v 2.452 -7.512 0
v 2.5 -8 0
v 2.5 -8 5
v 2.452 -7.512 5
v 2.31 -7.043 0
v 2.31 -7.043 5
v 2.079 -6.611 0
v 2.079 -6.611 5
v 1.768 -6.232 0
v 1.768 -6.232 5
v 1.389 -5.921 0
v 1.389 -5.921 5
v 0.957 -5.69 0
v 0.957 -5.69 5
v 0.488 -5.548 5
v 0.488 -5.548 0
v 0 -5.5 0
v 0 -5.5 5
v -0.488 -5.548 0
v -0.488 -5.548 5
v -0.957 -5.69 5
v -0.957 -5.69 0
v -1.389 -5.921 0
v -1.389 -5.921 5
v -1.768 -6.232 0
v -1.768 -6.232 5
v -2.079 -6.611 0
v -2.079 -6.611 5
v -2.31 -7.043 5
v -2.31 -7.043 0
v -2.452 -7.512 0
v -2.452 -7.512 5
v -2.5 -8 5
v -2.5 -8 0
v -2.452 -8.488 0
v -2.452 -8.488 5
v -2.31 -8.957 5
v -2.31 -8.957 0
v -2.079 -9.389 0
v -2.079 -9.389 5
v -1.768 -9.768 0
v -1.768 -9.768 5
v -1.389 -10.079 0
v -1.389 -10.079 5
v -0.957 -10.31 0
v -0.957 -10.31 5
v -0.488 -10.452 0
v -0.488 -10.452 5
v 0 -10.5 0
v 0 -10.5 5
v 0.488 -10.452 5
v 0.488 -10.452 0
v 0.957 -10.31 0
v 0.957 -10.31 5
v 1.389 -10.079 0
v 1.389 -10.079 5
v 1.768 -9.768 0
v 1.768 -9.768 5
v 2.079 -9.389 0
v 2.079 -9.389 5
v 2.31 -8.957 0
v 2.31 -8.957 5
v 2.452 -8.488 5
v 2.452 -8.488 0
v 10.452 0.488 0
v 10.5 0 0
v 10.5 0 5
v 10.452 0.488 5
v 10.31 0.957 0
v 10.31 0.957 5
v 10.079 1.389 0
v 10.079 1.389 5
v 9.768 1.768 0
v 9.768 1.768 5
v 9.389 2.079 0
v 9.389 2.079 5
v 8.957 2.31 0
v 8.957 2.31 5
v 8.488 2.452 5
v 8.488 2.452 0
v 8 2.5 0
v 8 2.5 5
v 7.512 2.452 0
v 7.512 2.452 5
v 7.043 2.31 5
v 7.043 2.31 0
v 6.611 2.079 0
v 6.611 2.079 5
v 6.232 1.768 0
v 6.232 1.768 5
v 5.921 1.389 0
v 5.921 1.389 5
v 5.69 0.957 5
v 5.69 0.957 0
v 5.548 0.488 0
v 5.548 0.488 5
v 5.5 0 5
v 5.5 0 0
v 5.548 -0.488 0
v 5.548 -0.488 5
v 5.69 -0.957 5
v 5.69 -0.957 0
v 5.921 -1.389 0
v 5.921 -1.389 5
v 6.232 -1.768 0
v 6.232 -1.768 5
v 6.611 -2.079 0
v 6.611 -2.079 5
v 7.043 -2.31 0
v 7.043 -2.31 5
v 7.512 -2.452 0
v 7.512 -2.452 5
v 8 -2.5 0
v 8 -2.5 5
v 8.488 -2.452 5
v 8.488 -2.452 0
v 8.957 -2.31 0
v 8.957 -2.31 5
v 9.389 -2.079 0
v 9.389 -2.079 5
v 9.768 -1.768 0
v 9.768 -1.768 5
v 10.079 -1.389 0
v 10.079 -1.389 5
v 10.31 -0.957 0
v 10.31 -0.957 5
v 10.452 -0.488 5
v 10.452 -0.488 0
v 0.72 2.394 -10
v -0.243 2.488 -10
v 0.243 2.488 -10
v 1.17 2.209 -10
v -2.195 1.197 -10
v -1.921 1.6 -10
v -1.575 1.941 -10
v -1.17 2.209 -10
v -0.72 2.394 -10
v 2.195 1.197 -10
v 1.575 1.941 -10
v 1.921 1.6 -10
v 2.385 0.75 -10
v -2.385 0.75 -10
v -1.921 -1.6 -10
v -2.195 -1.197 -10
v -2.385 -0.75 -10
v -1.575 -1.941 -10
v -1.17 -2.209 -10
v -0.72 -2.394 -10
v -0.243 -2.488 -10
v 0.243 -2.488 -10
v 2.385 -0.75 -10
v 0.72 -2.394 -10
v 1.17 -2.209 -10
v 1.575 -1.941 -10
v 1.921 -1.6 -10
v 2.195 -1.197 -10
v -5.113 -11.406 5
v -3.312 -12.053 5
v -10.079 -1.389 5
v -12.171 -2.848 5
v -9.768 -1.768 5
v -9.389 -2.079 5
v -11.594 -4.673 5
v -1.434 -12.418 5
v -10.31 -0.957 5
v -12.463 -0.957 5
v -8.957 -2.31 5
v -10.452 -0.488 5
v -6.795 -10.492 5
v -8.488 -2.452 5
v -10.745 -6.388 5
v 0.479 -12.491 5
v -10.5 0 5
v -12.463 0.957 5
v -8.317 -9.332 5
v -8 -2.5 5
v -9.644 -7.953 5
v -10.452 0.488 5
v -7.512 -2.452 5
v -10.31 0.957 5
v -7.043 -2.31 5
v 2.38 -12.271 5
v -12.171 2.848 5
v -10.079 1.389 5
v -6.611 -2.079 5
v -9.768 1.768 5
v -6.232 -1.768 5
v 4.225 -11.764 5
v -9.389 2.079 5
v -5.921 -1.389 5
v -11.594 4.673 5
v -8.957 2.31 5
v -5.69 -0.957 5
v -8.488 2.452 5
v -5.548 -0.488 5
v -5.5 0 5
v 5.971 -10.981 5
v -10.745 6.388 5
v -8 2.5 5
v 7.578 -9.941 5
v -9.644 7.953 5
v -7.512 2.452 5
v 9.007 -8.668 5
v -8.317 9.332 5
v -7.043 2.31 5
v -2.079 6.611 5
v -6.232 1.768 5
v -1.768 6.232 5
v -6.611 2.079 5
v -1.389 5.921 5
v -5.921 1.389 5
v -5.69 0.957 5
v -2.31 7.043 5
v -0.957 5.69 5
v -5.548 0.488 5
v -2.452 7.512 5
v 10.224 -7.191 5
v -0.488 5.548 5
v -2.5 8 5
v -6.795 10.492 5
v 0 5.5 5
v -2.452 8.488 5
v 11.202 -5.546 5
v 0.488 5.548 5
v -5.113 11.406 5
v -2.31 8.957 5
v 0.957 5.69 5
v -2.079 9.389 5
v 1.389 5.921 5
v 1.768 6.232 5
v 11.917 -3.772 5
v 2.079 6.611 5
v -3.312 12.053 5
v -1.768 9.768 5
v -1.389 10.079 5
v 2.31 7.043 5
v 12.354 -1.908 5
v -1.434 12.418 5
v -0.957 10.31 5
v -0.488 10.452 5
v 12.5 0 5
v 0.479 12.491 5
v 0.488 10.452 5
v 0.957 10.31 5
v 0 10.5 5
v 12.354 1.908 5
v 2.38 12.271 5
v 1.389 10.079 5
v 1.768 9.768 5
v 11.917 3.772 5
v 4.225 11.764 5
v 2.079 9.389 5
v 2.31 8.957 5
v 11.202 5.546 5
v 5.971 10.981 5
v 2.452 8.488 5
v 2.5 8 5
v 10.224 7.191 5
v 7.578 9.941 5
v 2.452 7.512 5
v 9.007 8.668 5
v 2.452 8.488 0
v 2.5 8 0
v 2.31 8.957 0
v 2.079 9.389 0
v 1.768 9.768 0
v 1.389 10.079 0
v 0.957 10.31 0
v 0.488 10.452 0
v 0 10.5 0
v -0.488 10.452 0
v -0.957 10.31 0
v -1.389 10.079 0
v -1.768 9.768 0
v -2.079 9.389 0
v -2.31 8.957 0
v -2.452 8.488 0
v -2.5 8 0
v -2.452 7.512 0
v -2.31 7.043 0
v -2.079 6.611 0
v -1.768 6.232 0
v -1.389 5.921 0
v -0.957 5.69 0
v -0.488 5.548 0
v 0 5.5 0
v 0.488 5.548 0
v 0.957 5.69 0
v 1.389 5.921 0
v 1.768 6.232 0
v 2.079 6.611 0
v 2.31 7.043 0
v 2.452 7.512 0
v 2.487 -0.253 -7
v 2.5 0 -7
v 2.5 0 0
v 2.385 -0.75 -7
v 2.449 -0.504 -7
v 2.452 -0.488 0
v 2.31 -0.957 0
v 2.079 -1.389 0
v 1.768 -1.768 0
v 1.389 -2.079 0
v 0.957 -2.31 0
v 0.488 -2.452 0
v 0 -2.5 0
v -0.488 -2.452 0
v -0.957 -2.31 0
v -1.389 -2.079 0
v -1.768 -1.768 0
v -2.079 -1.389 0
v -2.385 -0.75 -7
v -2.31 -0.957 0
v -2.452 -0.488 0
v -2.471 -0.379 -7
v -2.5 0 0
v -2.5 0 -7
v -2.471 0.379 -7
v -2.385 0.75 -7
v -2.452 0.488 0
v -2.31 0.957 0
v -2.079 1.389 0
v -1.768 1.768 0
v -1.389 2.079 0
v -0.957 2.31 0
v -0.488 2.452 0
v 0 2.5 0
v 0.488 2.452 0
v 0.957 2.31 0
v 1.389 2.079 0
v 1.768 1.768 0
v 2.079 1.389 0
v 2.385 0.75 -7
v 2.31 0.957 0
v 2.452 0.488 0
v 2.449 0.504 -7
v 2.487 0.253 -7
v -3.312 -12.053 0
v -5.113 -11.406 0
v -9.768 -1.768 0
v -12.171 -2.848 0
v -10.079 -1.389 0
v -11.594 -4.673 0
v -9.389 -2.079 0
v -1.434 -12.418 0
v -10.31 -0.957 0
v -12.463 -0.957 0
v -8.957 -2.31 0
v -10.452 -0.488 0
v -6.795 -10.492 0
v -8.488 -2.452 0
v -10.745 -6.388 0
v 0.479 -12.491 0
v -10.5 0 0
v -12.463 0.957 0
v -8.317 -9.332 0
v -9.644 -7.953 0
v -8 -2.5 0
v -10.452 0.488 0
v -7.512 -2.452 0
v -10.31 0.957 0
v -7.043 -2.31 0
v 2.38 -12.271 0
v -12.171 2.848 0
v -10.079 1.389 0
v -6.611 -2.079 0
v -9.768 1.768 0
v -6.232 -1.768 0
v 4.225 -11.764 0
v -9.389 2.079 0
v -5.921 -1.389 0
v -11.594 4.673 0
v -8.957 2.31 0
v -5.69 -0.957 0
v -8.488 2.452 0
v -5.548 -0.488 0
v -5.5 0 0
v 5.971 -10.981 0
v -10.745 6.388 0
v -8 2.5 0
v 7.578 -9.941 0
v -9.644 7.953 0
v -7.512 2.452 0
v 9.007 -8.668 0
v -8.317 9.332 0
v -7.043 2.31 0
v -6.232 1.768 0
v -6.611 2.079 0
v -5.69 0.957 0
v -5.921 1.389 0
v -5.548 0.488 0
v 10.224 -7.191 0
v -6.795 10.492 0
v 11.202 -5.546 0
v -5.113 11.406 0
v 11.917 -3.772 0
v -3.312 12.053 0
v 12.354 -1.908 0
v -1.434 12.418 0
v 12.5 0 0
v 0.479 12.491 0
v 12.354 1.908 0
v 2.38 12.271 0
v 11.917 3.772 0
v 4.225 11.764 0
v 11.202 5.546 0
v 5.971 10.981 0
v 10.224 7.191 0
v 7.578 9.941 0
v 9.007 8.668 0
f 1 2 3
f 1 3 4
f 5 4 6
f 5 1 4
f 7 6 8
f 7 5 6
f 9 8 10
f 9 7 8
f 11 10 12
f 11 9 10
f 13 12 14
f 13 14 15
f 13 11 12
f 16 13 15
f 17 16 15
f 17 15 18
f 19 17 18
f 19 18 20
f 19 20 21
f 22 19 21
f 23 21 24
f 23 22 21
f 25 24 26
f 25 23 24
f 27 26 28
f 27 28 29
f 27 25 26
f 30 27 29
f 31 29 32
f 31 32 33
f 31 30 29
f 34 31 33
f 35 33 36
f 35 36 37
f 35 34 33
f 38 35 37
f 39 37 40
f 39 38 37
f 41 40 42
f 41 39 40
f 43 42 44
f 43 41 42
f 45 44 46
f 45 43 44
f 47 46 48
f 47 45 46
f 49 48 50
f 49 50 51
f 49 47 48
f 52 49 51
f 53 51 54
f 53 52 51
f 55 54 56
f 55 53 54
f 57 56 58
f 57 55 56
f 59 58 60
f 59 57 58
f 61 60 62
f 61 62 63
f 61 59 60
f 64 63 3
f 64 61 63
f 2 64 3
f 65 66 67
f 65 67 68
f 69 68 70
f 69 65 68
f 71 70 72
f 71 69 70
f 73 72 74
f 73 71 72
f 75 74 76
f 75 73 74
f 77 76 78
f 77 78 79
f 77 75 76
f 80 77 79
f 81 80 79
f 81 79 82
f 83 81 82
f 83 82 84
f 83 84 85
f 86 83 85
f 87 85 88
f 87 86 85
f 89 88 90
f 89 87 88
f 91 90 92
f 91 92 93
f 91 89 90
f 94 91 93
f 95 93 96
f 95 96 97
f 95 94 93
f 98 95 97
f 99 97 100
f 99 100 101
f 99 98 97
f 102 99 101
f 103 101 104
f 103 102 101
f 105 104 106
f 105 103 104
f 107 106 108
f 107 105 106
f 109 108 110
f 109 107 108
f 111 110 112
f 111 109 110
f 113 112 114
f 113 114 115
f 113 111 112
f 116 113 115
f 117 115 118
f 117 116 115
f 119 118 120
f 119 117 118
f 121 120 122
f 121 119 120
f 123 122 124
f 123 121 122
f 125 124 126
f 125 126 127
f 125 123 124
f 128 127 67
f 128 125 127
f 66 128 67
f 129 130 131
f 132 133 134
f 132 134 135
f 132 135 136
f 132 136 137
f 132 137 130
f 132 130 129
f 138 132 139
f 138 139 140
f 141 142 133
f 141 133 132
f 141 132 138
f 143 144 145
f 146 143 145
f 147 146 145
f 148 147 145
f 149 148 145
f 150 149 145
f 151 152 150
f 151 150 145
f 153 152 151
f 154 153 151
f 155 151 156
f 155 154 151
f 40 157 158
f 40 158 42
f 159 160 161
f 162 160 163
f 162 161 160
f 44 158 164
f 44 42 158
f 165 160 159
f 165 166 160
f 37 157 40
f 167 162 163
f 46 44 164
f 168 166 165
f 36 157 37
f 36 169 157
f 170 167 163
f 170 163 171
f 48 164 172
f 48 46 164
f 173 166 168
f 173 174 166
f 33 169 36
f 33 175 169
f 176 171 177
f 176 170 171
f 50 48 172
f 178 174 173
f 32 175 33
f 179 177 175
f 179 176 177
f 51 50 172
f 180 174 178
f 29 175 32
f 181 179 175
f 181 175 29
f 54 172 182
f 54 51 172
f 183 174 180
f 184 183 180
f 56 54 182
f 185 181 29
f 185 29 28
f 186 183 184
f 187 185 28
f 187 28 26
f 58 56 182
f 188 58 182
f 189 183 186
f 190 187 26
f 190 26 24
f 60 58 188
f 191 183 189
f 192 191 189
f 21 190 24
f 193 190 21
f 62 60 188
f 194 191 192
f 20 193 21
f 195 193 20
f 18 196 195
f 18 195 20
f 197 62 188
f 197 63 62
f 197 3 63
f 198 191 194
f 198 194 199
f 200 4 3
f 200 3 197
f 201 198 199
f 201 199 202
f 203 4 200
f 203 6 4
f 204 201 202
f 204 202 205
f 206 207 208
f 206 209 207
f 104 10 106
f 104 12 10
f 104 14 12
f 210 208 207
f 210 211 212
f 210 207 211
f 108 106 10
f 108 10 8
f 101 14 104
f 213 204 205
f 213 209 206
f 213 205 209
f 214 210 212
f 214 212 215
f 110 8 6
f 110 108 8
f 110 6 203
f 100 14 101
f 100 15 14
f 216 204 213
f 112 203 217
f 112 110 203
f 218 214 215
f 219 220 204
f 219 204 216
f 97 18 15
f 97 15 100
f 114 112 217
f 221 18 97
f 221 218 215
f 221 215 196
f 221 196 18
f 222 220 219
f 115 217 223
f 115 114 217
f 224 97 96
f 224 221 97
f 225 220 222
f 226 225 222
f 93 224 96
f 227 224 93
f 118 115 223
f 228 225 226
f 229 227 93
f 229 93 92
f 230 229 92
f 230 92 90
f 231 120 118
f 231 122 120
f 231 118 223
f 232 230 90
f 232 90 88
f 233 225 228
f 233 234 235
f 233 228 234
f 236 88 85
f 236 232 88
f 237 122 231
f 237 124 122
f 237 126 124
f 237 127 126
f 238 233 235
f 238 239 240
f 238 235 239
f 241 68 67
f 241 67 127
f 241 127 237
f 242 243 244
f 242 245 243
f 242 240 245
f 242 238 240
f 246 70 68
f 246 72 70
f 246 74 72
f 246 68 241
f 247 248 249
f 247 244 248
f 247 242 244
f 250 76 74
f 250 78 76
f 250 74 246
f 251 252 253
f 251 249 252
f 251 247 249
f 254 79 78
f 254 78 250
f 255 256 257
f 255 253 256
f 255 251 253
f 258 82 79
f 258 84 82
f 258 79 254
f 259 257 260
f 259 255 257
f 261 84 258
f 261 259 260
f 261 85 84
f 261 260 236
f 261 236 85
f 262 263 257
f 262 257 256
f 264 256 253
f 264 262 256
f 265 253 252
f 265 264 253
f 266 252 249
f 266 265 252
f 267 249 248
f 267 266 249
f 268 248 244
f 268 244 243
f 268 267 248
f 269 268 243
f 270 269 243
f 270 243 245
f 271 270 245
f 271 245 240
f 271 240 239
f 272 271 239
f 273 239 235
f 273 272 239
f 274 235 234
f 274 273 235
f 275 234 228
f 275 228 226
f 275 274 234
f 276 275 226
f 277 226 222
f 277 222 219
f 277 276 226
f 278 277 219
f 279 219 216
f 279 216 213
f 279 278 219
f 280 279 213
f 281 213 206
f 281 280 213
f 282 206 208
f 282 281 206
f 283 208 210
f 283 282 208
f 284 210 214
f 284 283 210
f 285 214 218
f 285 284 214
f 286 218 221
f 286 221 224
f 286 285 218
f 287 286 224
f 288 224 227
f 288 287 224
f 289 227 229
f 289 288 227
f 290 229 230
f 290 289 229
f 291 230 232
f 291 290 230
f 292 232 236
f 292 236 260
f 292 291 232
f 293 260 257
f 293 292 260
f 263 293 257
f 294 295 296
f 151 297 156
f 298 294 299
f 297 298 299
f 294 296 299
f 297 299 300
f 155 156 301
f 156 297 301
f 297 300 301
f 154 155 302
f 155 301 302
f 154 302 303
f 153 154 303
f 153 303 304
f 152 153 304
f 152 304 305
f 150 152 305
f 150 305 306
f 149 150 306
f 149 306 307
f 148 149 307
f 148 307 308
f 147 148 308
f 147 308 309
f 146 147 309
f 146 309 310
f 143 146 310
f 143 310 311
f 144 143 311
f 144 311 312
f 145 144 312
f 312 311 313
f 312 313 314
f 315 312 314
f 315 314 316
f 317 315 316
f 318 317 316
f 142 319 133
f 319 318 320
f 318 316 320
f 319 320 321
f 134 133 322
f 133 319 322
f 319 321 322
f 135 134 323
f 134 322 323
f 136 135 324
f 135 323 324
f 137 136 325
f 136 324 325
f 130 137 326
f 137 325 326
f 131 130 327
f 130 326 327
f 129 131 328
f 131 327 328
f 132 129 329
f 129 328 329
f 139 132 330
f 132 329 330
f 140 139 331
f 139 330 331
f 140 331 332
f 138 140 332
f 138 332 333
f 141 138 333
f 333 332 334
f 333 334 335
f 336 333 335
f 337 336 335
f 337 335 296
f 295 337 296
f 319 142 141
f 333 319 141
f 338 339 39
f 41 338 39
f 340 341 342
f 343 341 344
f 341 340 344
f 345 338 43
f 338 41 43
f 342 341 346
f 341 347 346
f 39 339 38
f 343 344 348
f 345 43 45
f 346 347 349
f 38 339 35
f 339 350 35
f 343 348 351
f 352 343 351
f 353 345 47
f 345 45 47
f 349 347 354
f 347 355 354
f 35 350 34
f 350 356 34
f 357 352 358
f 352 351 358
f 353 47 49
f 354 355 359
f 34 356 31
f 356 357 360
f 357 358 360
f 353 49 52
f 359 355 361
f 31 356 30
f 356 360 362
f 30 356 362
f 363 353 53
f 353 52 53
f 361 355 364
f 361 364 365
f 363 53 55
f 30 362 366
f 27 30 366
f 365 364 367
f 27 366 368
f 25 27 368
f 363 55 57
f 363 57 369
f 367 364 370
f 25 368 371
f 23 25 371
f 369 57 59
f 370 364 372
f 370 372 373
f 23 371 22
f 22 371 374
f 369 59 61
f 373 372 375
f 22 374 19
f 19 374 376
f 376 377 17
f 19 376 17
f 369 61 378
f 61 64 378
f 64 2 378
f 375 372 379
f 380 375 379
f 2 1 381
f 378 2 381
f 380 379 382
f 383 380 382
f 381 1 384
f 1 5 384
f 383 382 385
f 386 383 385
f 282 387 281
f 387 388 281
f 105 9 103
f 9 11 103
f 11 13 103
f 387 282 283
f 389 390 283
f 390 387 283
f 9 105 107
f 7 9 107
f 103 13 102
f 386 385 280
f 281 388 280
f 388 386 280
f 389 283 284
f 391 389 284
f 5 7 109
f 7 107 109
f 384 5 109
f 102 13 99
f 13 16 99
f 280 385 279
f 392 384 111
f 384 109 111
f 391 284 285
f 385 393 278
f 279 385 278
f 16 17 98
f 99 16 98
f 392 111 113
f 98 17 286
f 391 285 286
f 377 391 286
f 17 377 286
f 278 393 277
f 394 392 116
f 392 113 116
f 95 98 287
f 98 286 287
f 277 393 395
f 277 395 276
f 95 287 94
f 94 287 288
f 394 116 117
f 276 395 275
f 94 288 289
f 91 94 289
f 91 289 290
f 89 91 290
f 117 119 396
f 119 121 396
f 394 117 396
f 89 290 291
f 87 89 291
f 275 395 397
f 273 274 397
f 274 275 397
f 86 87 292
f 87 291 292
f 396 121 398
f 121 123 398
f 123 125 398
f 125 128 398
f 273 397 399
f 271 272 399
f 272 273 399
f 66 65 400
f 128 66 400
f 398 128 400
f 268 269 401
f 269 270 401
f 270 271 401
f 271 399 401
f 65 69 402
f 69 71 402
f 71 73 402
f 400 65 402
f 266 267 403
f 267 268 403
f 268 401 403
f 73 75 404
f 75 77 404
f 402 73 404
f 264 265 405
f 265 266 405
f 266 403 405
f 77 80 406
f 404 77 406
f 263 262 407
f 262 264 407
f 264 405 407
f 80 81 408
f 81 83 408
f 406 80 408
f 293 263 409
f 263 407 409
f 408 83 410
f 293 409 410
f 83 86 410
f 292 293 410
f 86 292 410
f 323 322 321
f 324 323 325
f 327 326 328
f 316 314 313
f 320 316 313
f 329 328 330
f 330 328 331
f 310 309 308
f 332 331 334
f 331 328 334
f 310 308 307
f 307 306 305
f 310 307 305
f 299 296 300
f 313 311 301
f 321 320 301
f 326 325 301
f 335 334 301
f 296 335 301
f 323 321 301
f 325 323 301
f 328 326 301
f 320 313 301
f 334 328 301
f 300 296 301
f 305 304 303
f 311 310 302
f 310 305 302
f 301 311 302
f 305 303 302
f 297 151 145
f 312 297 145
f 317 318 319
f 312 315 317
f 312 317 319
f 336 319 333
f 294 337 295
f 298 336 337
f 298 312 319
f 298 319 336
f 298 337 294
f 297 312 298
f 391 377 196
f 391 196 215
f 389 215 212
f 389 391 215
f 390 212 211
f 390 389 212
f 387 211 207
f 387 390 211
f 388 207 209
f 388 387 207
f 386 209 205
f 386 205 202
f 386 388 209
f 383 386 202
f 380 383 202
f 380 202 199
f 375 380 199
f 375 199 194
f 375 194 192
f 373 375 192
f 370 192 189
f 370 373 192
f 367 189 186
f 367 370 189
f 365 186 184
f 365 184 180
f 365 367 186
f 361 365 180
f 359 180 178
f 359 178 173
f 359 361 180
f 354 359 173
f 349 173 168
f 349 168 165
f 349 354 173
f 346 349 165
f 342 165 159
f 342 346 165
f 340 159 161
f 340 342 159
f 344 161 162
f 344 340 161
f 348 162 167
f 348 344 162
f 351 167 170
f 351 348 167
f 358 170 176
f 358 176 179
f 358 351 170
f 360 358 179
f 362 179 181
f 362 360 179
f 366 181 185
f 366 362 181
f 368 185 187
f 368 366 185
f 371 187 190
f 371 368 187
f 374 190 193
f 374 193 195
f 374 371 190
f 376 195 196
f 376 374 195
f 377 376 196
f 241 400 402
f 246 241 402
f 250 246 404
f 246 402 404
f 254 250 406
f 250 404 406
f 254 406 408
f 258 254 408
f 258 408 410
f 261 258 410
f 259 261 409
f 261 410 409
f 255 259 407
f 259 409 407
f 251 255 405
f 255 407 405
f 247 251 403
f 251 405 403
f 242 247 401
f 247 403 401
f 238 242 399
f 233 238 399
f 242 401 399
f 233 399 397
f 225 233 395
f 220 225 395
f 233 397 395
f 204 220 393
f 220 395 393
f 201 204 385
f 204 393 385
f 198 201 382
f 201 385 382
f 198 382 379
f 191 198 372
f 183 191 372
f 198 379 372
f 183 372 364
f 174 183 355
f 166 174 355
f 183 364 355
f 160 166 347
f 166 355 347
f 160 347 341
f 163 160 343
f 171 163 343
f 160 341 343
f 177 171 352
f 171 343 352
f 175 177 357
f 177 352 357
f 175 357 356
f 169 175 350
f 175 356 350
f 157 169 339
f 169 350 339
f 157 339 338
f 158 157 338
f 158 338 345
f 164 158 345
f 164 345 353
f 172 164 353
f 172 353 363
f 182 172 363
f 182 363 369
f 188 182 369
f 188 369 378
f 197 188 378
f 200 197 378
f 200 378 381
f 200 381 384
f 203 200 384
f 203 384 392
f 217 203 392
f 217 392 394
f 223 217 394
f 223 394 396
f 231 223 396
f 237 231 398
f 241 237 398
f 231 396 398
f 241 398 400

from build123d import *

# Parameters (mm, degrees)
F0_R     = 12.5
F0_R_2   = 2.5
F1_DEPTH = 5
F2_R     = 2.5
F3_DEPTH = 10
F5_DEPTH = 3


with BuildPart() as f1:
    # F0 (on Top) → F1 (new body)
    with BuildSketch(Plane.XY):
        Circle(F0_R)
        with Locations((0, -8)):
            Circle(F0_R_2, mode=Mode.SUBTRACT)
        with Locations((-8, 0)):
            Circle(F0_R_2, mode=Mode.SUBTRACT)
        with Locations((8, 0)):
            Circle(F0_R_2, mode=Mode.SUBTRACT)
        with Locations((0, 8)):
            Circle(F0_R_2, mode=Mode.SUBTRACT)
    extrude(amount=F1_DEPTH)


with BuildPart() as f3:
    # F2 (on face) → F3 (new body)
    with BuildSketch(Plane(origin=(0, 0, 0), x_dir=(1, 0, 0), z_dir=(0, 0, -1))):
        Circle(F2_R)
    extrude(amount=F3_DEPTH)

    # F4 (on face) → F5 (cut)
    with BuildSketch(Plane(origin=(0, 0, -10), x_dir=(1, 0, 0), z_dir=(0, 0, -1))):
        with BuildLine():
            ThreePointArc((2.5, 0), (2.4710443145, 0.3793942482), (2.3848480035, 0.75))
            Line((2.3848480035, 0.75), (-2.3848480035, 0.75))
            ThreePointArc((-2.3848480035, 0.75), (-2.5, 0), (-2.3848480035, -0.75))
            Line((-2.3848480035, -0.75), (2.3848480035, -0.75))
            ThreePointArc((2.3848480035, -0.75), (2.4710443145, -0.3793942482), (2.5, 0))
        make_face()
    extrude(amount=-F5_DEPTH, mode=Mode.SUBTRACT)


solid = Compound([f1.part, f3.part])
